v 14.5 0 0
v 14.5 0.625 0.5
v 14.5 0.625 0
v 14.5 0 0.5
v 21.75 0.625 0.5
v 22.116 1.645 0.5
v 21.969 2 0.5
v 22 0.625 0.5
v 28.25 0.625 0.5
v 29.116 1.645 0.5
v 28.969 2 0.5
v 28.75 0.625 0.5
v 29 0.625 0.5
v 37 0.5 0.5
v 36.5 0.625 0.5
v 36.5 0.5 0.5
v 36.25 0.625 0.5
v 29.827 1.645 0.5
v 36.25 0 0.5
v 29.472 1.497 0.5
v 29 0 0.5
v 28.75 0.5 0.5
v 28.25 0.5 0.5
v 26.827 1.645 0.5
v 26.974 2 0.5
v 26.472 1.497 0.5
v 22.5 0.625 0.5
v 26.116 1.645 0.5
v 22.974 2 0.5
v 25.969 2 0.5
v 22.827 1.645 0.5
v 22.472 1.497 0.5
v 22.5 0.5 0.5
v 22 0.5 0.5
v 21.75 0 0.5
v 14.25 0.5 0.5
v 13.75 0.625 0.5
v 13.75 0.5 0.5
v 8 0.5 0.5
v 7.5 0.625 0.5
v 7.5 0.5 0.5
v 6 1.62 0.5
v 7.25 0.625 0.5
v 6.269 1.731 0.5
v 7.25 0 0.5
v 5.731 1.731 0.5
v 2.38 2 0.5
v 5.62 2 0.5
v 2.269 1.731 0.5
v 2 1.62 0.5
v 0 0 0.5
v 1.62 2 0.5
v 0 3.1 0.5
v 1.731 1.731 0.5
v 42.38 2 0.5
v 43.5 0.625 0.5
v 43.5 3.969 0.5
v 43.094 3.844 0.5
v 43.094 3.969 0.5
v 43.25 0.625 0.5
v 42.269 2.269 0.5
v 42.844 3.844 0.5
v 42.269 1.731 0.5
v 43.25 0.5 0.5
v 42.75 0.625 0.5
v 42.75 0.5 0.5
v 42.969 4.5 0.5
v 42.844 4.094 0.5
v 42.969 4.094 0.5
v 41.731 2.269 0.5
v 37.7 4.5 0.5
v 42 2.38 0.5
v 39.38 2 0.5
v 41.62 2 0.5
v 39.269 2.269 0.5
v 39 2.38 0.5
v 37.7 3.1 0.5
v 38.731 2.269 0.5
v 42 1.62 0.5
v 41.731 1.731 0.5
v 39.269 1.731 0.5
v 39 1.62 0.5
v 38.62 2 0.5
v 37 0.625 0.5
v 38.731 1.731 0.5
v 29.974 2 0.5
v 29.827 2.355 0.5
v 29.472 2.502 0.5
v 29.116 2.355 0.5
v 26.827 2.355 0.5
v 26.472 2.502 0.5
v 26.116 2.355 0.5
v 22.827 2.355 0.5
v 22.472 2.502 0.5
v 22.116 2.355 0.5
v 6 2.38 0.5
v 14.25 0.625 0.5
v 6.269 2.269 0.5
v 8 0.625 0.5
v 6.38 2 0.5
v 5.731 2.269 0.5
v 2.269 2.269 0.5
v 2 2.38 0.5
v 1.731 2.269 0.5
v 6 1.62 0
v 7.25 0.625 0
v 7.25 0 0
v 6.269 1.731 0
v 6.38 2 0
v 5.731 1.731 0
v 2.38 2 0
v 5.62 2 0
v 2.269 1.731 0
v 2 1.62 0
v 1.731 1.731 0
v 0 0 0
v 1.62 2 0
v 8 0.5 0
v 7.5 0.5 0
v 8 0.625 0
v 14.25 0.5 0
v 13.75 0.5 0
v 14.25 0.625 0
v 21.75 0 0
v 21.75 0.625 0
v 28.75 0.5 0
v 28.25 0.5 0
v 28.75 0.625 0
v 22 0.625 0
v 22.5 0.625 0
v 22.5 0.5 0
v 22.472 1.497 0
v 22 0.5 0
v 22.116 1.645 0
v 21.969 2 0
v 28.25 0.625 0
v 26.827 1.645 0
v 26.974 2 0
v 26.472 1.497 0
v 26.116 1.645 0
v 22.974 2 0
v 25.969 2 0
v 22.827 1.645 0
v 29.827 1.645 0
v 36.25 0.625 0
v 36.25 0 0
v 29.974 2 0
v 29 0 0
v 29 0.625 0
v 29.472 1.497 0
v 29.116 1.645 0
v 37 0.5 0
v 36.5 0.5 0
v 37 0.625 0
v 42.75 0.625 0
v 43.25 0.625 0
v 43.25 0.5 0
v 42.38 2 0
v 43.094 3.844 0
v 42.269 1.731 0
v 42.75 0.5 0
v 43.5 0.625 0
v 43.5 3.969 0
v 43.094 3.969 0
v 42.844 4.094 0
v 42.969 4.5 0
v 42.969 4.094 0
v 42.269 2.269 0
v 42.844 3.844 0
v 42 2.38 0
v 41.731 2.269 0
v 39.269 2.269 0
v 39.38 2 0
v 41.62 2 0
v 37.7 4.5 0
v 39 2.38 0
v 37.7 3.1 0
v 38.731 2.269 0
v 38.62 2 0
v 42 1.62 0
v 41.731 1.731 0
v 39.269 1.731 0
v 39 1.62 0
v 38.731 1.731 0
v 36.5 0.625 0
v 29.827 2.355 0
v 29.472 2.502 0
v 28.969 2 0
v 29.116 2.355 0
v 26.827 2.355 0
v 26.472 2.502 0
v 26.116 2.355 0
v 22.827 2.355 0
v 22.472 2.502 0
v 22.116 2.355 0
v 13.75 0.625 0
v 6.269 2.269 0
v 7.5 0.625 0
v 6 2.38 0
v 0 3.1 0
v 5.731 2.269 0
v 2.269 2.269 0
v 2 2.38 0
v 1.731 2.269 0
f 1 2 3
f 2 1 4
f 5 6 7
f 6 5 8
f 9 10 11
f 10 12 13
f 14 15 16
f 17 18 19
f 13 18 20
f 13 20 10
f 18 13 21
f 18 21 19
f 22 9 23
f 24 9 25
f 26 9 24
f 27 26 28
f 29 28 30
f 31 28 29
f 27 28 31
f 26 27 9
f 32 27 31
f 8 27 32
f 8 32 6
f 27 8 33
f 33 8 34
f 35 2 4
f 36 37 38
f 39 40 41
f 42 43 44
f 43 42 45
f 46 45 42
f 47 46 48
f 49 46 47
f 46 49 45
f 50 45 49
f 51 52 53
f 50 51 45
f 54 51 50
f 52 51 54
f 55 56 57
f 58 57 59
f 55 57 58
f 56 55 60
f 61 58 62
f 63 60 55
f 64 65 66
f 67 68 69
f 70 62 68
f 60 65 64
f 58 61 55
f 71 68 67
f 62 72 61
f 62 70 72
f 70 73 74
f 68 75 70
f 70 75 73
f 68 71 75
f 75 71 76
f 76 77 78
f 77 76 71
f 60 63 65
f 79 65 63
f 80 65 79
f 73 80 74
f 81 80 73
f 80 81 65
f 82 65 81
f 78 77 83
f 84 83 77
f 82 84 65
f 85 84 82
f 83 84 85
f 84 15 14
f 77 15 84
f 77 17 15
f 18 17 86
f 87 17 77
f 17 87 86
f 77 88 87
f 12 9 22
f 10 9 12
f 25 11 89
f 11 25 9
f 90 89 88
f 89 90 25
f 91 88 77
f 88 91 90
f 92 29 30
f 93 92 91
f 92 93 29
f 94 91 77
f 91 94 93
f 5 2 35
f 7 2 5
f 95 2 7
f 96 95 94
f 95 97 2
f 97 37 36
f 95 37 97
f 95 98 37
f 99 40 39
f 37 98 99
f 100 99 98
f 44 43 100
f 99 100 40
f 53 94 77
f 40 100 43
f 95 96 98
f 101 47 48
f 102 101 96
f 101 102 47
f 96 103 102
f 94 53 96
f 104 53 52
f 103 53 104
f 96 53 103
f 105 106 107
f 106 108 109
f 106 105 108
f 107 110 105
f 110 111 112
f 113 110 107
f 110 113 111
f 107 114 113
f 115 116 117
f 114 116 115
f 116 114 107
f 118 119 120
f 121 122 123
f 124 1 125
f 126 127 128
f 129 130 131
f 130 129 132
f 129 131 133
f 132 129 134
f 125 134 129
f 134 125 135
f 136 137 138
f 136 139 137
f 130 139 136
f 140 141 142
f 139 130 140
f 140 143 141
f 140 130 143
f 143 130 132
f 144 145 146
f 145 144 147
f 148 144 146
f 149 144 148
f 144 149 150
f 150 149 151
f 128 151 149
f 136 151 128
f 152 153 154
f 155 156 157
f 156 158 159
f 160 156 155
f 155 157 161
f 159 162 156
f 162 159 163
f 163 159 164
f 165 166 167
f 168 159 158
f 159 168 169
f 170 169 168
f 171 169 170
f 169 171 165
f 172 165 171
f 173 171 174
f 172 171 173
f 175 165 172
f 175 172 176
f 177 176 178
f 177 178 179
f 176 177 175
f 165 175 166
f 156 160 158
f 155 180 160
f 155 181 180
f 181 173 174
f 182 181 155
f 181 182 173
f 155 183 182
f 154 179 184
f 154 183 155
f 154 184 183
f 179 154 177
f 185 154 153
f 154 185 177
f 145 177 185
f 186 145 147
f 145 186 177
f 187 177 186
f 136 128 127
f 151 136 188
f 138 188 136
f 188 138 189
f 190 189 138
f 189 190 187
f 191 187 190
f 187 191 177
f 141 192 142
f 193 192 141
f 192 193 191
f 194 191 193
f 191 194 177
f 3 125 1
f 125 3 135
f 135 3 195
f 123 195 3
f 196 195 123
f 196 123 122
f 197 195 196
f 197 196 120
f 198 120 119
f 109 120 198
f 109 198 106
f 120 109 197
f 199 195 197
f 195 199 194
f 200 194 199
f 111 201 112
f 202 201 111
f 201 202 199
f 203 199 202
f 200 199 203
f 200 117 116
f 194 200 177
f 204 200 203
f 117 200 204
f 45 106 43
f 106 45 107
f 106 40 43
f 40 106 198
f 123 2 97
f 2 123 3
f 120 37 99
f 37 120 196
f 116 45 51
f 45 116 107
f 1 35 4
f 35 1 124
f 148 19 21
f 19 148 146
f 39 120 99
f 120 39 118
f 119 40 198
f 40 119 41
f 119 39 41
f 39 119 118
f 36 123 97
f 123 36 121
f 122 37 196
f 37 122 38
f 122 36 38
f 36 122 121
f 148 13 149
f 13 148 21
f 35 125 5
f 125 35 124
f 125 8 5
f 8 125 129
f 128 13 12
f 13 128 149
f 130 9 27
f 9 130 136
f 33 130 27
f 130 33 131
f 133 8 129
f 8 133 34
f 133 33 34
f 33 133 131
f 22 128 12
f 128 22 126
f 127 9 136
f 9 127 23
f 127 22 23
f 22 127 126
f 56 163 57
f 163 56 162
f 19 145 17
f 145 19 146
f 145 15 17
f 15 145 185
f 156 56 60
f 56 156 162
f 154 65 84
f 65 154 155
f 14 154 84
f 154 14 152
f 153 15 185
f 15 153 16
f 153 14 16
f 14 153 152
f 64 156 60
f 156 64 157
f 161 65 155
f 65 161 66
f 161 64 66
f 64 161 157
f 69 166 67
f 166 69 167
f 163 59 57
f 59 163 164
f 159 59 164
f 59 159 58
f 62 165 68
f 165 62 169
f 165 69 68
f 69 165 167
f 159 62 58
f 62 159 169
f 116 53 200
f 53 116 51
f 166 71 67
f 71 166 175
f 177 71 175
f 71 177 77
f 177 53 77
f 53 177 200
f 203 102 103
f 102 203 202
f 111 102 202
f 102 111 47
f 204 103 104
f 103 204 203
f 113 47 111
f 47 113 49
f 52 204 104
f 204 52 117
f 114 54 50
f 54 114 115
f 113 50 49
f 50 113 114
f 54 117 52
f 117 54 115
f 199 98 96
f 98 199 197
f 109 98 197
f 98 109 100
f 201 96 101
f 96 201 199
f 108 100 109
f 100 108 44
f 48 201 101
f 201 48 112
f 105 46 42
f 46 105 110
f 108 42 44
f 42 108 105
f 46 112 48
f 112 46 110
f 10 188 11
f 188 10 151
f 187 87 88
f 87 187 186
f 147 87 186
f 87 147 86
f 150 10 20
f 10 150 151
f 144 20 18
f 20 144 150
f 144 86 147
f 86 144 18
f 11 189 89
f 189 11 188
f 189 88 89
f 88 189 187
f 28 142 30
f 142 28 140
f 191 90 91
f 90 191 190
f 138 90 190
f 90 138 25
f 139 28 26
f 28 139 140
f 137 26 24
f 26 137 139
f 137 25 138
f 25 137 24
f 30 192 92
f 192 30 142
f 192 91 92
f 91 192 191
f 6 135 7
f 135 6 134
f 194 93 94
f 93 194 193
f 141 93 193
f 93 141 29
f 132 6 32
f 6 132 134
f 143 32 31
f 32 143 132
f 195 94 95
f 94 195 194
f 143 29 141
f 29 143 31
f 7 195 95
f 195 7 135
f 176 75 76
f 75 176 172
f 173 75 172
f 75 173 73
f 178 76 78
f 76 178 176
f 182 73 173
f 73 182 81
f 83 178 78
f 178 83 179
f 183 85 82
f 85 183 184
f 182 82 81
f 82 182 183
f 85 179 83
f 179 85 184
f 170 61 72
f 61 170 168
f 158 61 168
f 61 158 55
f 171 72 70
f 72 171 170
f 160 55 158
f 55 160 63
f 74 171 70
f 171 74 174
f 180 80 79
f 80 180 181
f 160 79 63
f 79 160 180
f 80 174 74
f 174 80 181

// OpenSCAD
// file: modus.scad
//Corner Joint - allows the sides of two parts to create inlayed corner. Aids with welding.
//need to verify module math is the same throughout all parts.

module cornerjoint(Z,L,H,EndGap,PadL,PadH,CJangle,CJcenter){
    //change so that H = Z of inlayed part (usually 0.5)
    //add center and angle in degrees option, orgin far side of cut out area

     if((CJangle==0)&&(CJcenter==0))
      {    
        translate([0,0,0])
        rotate([0,0,CJangle])
        difference(){
        cube([L,H+PadH,Z]);
        translate([EndGap,H,0])
        cube([PadL,PadH,Z]);
        translate([L-EndGap-PadL,H,0])
        cube([PadL,PadH,Z]);}
      }    
else if((CJangle==90)&&(CJcenter==0))
      {    
        translate([H+PadH,0,0])
        rotate([0,0,CJangle])
        difference(){
        cube([L,H+PadH,Z]);
        translate([EndGap,H,0])
        cube([PadL,PadH,Z]);
        translate([L-EndGap-PadL,H,0])
        cube([PadL,PadH,Z]);}
      }
else if((CJangle==180)&&(CJcenter==0))       
      {    
        translate([L,H+PadH,0])
        rotate([0,0,CJangle])
        difference(){
        cube([L,H+PadH,Z]);
        translate([EndGap,H,0])
        cube([PadL,PadH,Z]);
        translate([L-EndGap-PadL,H,0])
        cube([PadL,PadH,Z]);}
      }
else if((CJangle==270)&&(CJcenter==0))
      {    
        translate([0,L,0])
        rotate([0,0,CJangle])
        difference(){
        cube([L,H+PadH,Z]);
        translate([EndGap,H,0])
        cube([PadL,PadH,Z]);
        translate([L-EndGap-PadL,H,0])
        cube([PadL,PadH,Z]);}
      }  
      
//centered     
   
else if((CJangle==0)&&(CJcenter==1))
      {    
        translate([-L/2,0,0])
        rotate([0,0,CJangle])
        difference(){
        cube([L,H+PadH,Z]);
        translate([EndGap,H,0])
        cube([PadL,PadH,Z]);
        translate([L-EndGap-PadL,H,0])
        cube([PadL,PadH,Z]);}
      }  
else if((CJangle==90)&&(CJcenter==1))
      {    
        translate([0,-L/2,0])
        rotate([0,0,CJangle])
        difference(){
        cube([L,H+PadH,Z]);
        translate([EndGap,H,0])
        cube([PadL,PadH,Z]);
        translate([L-EndGap-PadL,H,0])
        cube([PadL,PadH,Z]);}
      }
else if((CJangle==180)&&(CJcenter==1))       
      {    
        translate([L/2,0,0])
        rotate([0,0,CJangle])
        difference(){
        cube([L,H+PadH,Z]);
        translate([EndGap,H,0])
        cube([PadL,PadH,Z]);
        translate([L-EndGap-PadL,H,0])
        cube([PadL,PadH,Z]);}
      }
else if((CJangle==270)&&(CJcenter==1))
      {    
        translate([0,L/2,0])
        rotate([0,0,CJangle])
        difference(){
        cube([L,H+PadH,Z]);
        translate([EndGap,H,0])
        cube([PadL,PadH,Z]);
        translate([L-EndGap-PadL,H,0])
        cube([PadL,PadH,Z]);}
      }
} //end cornerjoint module

//Tab Insert - used to cut a hole for an abutting part to insert into. Typically aids with welding the two parts.
module tabinsert(X,Y,Z,dGap,cGap,c1,c2,c3,c4,c5,c6,c7,c8,center){
    translate([-dGap-(center*(X/2)),-dGap-(center*(Y/2)),0]){
        //main cut
        cube([X+(dGap*2),Y+(dGap*2),Z]);
        //corner c1c2
        translate([-cGap,(Y+(dGap*2))-c1+cGap,0])
            {
        cube([c2,c1,Z]);}
       //corner c3c4
       translate([(X+(dGap*2))-c3+cGap,(Y+(dGap*2))-c4+cGap,0]){
           cube([c3,c4,Z]);
       }
       //corner c5c6
       translate([(X+(dGap*2))-c6+cGap,-cGap,0])
      {
          cube([c6,c5,Z]);
      }
       
       //corner c7c8 
       translate([-cGap,-cGap,0]){
           cube([c7,c8,Z]);
       }
    
    } //end center translate
} //end tabinsert module
 
// file: vars.scad
brickW=6; 
brickL=12;
brickCH=6;

$fn=8; //defines resolution of circles. 8 is okay for review. 100  or greater should be used for for final dxf export.

dZstandard=0.5; //thickness of steel to be cut for drawer parts
fZstandard=0.5;
aZstandard=0.5; //thickness of steel to be cut for arm parts

fBOLTHOLEstandardD=1; //standard bolts used on frame
sliderodholeOD=1.2; 

dGap=0.03125; //gap between a hole cut's edge and the part sitting within the hole. //D3 appears to use 0.3125, is this in error?

//all parts set to standard thickness below
//off standard preferences can be defined below

//drawer
drawergap=0.0283;  //extra room for drawer to slide in the space between f1 and f4
drawerHgap=0.1884;  //total extra space from drawer sides to frame walls. sum of both sides.

d1z=dZstandard;
d2z=dZstandard;
d3z=dZstandard;
d4z=dZstandard;
d5z=dZstandard;
d6z=dZstandard;
d5z=dZstandard;
d7z=dZstandard;
d8z=dZstandard;
d9z=dZstandard;

//frame
f1x=24.2;
f1y=6;
f1z=0.5;


f2y=3.5;
f2z=fZstandard;

f3x=f1x;
f3y=3.5;
f3z=fZstandard;

f4y=11;
f4z=fZstandard;

f5y=3.5;
f5z=fZstandard;

f6y=8;
f6z=fZstandard;

f8y=brickW;
f8z=fZstandard;
f8boltD=1;

f9y=4.5;
f9x=43.5;  //set based on MAINcylinder
f9z=fZstandard;

f8x=f9x;

f11x=1.25;
f11z=fZstandard;

f13z=fZstandard;

//arms

a1x=4;
a1y=72; //calculate based on drawer cylinder
a1z=aZstandard;

a2x=6;
a2y=72;  //calculate based on drawer cylinder
a2z=aZstandard;

a4z=aZstandard;
a6z=aZstandard;

//
//Input your main cylinder's dimenions here
//
cylinderMAINminC2E=0; //main hydraulic cylinder's distance from center of mounting hole to the end of the shaft when fully compressed.
cylinderMAINmaxC2E=0; //main hydraulic cylinder's distance from center of mounting hole to the end of the shaft when fully extended.

//
//Input your drawer cylinder's dimenions here
//
cylinderDRAWERbodyH=3; //measured when in position, largest length from top to bottom of cylinder
cylinderDRAWERminC2C=0; //drawer's hydraulic cylinder's distance from the center of one mounting hole to the center of the other when fully compressed.
cylinderDRAWERmaxC2C=0; ///drawer's hydraulic cylinder's distance from the center of one mounting hole to the center of the other when fully extended.
cylinderDRAWERrodclevisW=2.5; //width of cylinders' clevis on end of rod
cylinderDRAWERrodclevisID=1;
cylinderDRAWERrodclevisOD=2;
cylinderDRAWERrearclevisW=2.5; //width of mounting clevis cylinder body
cylinderDRAWERrearclevisID=1;
cylinderDRAWERrearclevisOD=2;
cylinderDRAWERrearclevisClearance=3; //usable space around rear clevis pin (in diameter). be aware of hyraulic fittings.

//the following variables are calculated in order of dependence on preceding variables
d3x=brickL+(d2z*2);
d3y=brickCH-d1z;
d4x=brickW+d3z+d3z;
d4y=brickCH-d1z;
d5x=brickL+(d2z*2);
d5y=brickW;
d6x=brickL+(d2z*2);
d6y=brickCH;
d7x=cylinderDRAWERrearclevisClearance;
d7y=a4z+d8z+cylinderDRAWERbodyH;
d9x=cylinderDRAWERbodyH+d6z;
d9y=cylinderDRAWERbodyH+d8z;
d8x=brickL+(d2z*2);
d8y=max(5,(d9x-d6z));   //need to review fundamentals, 5 minimun unless d9 gets larger than d8
d1x=18.5;   //need to come up with a formula
d1y=18;     //need to come up with a formula
d2x=d8y+d6z+brickW+d3z+d5y+d3z;
d2y=brickCH;

f11y=f8y;
f6x=brickL+(d2z*2)+(f9y*2)+drawerHgap;
f8x=43.5;  //need to define based on MAINcylinder inputs


f2x=brickL+(d2z*2)+drawerHgap+(f9y*2)-(1.4*2);  //distance between large cut outs in f9

f5x=brickL+(d2z*2)+drawerHgap+(f9y*2)+(a1x*2); //distance between outer edges of each A1

f4x=f5x-0.5;   //same as f5 but minus 0.25 on each side to give a little overhang
// main file
include <vars.scad>;
use <modus.scad>;

f9p();

module f9p(){

difference(){
cube([f9x,f9y,f9z]);
    translate([(3/12)*f9x,0,0])
        cornerjoint(f9z,(f8x/6),f8z,0.25,0.5,0.125,0,1);
    translate([(7/12)*f9x,0,0])
        cornerjoint(f9z,(f8x/6),f8z,0.25,0.5,0.125,0,1);
    translate([(11/12)*f9x,0,0])
        cornerjoint(f9z,(f8x/6),f8z,0.25,0.5,0.125,0,1);
    
    
    translate([0,f9y-0.5,0])
        tabinsert(0.5,0.5,f9z,0.03125,0.125,0,0,0,0,0.25,0.25,0,0,0);
    translate([f9x-f1y-d2y-f4y-drawergap-0.5,f9y-0.5,0])
        tabinsert(0.5,0.5,f9z,0.03125,0.125,0,0,0,0,0.25,0.25,0.25,0.25,0);
    translate([f9x-0.5,f9y-0.5,0])
        tabinsert(0.5,0.5,f9z,0.03125,0.125,0,0,0,0,0,0,0.25,0.25,0);
    
    
    //big cutout
    translate([f9x-(f1y-0.2)-(a2y+0.4),f9y-1.4,0])
        cube([a2y+0.4,1.4,f9z]);  //?interfaces with a2?
    
    
    //bolt holes
    //f6
    translate([2,2,0])  //?x interfaces with f6?  
    //replacing translate y=1.9 with y=f9y-2.5
        cylinder(h = f9z, r = 0.38);
    translate([6,2,0])  //?x interfaces with f6?
        cylinder(h = f9z, r = 0.38);   
        
        
        //distance from center to edge of part is 1.5
        //distance between center to center is 9.5283
        //distance from center to edge of part is 2
        //gap between parts is 6.0283
        //drawer is 6.0 tall
        //leaves 0.0283 space 
        //should this be 0.03125? (1/32)
        
        //should f4 be attached with 4 smaller bolts instead of 3 big ones. would prevent all movement?
        //f4
    translate([f9x-f1y-d2y-drawergap-2,2,0]) //replacing translate y=1.9 with f9y-2.5
        cylinder(h = f9z, r = 0.5025);
    translate([f9x-f1y-d2y-drawergap-5,2,0])
        cylinder(h = f9z, r = 0.5025);
    translate([f9x-f1y-d2y-drawergap-9,2,0])
        cylinder(h = f9z, r = 0.5025);
    
    //f1
    translate([f9x-4.5,2,0])  //?x interfaces with f1?
        cylinder(h = f9z, r = 0.38);
    translate([f9x-1.5,2,0])  //?x interfaces with f1?
        cylinder(h = f9z, r = 0.38);   
    }

}
